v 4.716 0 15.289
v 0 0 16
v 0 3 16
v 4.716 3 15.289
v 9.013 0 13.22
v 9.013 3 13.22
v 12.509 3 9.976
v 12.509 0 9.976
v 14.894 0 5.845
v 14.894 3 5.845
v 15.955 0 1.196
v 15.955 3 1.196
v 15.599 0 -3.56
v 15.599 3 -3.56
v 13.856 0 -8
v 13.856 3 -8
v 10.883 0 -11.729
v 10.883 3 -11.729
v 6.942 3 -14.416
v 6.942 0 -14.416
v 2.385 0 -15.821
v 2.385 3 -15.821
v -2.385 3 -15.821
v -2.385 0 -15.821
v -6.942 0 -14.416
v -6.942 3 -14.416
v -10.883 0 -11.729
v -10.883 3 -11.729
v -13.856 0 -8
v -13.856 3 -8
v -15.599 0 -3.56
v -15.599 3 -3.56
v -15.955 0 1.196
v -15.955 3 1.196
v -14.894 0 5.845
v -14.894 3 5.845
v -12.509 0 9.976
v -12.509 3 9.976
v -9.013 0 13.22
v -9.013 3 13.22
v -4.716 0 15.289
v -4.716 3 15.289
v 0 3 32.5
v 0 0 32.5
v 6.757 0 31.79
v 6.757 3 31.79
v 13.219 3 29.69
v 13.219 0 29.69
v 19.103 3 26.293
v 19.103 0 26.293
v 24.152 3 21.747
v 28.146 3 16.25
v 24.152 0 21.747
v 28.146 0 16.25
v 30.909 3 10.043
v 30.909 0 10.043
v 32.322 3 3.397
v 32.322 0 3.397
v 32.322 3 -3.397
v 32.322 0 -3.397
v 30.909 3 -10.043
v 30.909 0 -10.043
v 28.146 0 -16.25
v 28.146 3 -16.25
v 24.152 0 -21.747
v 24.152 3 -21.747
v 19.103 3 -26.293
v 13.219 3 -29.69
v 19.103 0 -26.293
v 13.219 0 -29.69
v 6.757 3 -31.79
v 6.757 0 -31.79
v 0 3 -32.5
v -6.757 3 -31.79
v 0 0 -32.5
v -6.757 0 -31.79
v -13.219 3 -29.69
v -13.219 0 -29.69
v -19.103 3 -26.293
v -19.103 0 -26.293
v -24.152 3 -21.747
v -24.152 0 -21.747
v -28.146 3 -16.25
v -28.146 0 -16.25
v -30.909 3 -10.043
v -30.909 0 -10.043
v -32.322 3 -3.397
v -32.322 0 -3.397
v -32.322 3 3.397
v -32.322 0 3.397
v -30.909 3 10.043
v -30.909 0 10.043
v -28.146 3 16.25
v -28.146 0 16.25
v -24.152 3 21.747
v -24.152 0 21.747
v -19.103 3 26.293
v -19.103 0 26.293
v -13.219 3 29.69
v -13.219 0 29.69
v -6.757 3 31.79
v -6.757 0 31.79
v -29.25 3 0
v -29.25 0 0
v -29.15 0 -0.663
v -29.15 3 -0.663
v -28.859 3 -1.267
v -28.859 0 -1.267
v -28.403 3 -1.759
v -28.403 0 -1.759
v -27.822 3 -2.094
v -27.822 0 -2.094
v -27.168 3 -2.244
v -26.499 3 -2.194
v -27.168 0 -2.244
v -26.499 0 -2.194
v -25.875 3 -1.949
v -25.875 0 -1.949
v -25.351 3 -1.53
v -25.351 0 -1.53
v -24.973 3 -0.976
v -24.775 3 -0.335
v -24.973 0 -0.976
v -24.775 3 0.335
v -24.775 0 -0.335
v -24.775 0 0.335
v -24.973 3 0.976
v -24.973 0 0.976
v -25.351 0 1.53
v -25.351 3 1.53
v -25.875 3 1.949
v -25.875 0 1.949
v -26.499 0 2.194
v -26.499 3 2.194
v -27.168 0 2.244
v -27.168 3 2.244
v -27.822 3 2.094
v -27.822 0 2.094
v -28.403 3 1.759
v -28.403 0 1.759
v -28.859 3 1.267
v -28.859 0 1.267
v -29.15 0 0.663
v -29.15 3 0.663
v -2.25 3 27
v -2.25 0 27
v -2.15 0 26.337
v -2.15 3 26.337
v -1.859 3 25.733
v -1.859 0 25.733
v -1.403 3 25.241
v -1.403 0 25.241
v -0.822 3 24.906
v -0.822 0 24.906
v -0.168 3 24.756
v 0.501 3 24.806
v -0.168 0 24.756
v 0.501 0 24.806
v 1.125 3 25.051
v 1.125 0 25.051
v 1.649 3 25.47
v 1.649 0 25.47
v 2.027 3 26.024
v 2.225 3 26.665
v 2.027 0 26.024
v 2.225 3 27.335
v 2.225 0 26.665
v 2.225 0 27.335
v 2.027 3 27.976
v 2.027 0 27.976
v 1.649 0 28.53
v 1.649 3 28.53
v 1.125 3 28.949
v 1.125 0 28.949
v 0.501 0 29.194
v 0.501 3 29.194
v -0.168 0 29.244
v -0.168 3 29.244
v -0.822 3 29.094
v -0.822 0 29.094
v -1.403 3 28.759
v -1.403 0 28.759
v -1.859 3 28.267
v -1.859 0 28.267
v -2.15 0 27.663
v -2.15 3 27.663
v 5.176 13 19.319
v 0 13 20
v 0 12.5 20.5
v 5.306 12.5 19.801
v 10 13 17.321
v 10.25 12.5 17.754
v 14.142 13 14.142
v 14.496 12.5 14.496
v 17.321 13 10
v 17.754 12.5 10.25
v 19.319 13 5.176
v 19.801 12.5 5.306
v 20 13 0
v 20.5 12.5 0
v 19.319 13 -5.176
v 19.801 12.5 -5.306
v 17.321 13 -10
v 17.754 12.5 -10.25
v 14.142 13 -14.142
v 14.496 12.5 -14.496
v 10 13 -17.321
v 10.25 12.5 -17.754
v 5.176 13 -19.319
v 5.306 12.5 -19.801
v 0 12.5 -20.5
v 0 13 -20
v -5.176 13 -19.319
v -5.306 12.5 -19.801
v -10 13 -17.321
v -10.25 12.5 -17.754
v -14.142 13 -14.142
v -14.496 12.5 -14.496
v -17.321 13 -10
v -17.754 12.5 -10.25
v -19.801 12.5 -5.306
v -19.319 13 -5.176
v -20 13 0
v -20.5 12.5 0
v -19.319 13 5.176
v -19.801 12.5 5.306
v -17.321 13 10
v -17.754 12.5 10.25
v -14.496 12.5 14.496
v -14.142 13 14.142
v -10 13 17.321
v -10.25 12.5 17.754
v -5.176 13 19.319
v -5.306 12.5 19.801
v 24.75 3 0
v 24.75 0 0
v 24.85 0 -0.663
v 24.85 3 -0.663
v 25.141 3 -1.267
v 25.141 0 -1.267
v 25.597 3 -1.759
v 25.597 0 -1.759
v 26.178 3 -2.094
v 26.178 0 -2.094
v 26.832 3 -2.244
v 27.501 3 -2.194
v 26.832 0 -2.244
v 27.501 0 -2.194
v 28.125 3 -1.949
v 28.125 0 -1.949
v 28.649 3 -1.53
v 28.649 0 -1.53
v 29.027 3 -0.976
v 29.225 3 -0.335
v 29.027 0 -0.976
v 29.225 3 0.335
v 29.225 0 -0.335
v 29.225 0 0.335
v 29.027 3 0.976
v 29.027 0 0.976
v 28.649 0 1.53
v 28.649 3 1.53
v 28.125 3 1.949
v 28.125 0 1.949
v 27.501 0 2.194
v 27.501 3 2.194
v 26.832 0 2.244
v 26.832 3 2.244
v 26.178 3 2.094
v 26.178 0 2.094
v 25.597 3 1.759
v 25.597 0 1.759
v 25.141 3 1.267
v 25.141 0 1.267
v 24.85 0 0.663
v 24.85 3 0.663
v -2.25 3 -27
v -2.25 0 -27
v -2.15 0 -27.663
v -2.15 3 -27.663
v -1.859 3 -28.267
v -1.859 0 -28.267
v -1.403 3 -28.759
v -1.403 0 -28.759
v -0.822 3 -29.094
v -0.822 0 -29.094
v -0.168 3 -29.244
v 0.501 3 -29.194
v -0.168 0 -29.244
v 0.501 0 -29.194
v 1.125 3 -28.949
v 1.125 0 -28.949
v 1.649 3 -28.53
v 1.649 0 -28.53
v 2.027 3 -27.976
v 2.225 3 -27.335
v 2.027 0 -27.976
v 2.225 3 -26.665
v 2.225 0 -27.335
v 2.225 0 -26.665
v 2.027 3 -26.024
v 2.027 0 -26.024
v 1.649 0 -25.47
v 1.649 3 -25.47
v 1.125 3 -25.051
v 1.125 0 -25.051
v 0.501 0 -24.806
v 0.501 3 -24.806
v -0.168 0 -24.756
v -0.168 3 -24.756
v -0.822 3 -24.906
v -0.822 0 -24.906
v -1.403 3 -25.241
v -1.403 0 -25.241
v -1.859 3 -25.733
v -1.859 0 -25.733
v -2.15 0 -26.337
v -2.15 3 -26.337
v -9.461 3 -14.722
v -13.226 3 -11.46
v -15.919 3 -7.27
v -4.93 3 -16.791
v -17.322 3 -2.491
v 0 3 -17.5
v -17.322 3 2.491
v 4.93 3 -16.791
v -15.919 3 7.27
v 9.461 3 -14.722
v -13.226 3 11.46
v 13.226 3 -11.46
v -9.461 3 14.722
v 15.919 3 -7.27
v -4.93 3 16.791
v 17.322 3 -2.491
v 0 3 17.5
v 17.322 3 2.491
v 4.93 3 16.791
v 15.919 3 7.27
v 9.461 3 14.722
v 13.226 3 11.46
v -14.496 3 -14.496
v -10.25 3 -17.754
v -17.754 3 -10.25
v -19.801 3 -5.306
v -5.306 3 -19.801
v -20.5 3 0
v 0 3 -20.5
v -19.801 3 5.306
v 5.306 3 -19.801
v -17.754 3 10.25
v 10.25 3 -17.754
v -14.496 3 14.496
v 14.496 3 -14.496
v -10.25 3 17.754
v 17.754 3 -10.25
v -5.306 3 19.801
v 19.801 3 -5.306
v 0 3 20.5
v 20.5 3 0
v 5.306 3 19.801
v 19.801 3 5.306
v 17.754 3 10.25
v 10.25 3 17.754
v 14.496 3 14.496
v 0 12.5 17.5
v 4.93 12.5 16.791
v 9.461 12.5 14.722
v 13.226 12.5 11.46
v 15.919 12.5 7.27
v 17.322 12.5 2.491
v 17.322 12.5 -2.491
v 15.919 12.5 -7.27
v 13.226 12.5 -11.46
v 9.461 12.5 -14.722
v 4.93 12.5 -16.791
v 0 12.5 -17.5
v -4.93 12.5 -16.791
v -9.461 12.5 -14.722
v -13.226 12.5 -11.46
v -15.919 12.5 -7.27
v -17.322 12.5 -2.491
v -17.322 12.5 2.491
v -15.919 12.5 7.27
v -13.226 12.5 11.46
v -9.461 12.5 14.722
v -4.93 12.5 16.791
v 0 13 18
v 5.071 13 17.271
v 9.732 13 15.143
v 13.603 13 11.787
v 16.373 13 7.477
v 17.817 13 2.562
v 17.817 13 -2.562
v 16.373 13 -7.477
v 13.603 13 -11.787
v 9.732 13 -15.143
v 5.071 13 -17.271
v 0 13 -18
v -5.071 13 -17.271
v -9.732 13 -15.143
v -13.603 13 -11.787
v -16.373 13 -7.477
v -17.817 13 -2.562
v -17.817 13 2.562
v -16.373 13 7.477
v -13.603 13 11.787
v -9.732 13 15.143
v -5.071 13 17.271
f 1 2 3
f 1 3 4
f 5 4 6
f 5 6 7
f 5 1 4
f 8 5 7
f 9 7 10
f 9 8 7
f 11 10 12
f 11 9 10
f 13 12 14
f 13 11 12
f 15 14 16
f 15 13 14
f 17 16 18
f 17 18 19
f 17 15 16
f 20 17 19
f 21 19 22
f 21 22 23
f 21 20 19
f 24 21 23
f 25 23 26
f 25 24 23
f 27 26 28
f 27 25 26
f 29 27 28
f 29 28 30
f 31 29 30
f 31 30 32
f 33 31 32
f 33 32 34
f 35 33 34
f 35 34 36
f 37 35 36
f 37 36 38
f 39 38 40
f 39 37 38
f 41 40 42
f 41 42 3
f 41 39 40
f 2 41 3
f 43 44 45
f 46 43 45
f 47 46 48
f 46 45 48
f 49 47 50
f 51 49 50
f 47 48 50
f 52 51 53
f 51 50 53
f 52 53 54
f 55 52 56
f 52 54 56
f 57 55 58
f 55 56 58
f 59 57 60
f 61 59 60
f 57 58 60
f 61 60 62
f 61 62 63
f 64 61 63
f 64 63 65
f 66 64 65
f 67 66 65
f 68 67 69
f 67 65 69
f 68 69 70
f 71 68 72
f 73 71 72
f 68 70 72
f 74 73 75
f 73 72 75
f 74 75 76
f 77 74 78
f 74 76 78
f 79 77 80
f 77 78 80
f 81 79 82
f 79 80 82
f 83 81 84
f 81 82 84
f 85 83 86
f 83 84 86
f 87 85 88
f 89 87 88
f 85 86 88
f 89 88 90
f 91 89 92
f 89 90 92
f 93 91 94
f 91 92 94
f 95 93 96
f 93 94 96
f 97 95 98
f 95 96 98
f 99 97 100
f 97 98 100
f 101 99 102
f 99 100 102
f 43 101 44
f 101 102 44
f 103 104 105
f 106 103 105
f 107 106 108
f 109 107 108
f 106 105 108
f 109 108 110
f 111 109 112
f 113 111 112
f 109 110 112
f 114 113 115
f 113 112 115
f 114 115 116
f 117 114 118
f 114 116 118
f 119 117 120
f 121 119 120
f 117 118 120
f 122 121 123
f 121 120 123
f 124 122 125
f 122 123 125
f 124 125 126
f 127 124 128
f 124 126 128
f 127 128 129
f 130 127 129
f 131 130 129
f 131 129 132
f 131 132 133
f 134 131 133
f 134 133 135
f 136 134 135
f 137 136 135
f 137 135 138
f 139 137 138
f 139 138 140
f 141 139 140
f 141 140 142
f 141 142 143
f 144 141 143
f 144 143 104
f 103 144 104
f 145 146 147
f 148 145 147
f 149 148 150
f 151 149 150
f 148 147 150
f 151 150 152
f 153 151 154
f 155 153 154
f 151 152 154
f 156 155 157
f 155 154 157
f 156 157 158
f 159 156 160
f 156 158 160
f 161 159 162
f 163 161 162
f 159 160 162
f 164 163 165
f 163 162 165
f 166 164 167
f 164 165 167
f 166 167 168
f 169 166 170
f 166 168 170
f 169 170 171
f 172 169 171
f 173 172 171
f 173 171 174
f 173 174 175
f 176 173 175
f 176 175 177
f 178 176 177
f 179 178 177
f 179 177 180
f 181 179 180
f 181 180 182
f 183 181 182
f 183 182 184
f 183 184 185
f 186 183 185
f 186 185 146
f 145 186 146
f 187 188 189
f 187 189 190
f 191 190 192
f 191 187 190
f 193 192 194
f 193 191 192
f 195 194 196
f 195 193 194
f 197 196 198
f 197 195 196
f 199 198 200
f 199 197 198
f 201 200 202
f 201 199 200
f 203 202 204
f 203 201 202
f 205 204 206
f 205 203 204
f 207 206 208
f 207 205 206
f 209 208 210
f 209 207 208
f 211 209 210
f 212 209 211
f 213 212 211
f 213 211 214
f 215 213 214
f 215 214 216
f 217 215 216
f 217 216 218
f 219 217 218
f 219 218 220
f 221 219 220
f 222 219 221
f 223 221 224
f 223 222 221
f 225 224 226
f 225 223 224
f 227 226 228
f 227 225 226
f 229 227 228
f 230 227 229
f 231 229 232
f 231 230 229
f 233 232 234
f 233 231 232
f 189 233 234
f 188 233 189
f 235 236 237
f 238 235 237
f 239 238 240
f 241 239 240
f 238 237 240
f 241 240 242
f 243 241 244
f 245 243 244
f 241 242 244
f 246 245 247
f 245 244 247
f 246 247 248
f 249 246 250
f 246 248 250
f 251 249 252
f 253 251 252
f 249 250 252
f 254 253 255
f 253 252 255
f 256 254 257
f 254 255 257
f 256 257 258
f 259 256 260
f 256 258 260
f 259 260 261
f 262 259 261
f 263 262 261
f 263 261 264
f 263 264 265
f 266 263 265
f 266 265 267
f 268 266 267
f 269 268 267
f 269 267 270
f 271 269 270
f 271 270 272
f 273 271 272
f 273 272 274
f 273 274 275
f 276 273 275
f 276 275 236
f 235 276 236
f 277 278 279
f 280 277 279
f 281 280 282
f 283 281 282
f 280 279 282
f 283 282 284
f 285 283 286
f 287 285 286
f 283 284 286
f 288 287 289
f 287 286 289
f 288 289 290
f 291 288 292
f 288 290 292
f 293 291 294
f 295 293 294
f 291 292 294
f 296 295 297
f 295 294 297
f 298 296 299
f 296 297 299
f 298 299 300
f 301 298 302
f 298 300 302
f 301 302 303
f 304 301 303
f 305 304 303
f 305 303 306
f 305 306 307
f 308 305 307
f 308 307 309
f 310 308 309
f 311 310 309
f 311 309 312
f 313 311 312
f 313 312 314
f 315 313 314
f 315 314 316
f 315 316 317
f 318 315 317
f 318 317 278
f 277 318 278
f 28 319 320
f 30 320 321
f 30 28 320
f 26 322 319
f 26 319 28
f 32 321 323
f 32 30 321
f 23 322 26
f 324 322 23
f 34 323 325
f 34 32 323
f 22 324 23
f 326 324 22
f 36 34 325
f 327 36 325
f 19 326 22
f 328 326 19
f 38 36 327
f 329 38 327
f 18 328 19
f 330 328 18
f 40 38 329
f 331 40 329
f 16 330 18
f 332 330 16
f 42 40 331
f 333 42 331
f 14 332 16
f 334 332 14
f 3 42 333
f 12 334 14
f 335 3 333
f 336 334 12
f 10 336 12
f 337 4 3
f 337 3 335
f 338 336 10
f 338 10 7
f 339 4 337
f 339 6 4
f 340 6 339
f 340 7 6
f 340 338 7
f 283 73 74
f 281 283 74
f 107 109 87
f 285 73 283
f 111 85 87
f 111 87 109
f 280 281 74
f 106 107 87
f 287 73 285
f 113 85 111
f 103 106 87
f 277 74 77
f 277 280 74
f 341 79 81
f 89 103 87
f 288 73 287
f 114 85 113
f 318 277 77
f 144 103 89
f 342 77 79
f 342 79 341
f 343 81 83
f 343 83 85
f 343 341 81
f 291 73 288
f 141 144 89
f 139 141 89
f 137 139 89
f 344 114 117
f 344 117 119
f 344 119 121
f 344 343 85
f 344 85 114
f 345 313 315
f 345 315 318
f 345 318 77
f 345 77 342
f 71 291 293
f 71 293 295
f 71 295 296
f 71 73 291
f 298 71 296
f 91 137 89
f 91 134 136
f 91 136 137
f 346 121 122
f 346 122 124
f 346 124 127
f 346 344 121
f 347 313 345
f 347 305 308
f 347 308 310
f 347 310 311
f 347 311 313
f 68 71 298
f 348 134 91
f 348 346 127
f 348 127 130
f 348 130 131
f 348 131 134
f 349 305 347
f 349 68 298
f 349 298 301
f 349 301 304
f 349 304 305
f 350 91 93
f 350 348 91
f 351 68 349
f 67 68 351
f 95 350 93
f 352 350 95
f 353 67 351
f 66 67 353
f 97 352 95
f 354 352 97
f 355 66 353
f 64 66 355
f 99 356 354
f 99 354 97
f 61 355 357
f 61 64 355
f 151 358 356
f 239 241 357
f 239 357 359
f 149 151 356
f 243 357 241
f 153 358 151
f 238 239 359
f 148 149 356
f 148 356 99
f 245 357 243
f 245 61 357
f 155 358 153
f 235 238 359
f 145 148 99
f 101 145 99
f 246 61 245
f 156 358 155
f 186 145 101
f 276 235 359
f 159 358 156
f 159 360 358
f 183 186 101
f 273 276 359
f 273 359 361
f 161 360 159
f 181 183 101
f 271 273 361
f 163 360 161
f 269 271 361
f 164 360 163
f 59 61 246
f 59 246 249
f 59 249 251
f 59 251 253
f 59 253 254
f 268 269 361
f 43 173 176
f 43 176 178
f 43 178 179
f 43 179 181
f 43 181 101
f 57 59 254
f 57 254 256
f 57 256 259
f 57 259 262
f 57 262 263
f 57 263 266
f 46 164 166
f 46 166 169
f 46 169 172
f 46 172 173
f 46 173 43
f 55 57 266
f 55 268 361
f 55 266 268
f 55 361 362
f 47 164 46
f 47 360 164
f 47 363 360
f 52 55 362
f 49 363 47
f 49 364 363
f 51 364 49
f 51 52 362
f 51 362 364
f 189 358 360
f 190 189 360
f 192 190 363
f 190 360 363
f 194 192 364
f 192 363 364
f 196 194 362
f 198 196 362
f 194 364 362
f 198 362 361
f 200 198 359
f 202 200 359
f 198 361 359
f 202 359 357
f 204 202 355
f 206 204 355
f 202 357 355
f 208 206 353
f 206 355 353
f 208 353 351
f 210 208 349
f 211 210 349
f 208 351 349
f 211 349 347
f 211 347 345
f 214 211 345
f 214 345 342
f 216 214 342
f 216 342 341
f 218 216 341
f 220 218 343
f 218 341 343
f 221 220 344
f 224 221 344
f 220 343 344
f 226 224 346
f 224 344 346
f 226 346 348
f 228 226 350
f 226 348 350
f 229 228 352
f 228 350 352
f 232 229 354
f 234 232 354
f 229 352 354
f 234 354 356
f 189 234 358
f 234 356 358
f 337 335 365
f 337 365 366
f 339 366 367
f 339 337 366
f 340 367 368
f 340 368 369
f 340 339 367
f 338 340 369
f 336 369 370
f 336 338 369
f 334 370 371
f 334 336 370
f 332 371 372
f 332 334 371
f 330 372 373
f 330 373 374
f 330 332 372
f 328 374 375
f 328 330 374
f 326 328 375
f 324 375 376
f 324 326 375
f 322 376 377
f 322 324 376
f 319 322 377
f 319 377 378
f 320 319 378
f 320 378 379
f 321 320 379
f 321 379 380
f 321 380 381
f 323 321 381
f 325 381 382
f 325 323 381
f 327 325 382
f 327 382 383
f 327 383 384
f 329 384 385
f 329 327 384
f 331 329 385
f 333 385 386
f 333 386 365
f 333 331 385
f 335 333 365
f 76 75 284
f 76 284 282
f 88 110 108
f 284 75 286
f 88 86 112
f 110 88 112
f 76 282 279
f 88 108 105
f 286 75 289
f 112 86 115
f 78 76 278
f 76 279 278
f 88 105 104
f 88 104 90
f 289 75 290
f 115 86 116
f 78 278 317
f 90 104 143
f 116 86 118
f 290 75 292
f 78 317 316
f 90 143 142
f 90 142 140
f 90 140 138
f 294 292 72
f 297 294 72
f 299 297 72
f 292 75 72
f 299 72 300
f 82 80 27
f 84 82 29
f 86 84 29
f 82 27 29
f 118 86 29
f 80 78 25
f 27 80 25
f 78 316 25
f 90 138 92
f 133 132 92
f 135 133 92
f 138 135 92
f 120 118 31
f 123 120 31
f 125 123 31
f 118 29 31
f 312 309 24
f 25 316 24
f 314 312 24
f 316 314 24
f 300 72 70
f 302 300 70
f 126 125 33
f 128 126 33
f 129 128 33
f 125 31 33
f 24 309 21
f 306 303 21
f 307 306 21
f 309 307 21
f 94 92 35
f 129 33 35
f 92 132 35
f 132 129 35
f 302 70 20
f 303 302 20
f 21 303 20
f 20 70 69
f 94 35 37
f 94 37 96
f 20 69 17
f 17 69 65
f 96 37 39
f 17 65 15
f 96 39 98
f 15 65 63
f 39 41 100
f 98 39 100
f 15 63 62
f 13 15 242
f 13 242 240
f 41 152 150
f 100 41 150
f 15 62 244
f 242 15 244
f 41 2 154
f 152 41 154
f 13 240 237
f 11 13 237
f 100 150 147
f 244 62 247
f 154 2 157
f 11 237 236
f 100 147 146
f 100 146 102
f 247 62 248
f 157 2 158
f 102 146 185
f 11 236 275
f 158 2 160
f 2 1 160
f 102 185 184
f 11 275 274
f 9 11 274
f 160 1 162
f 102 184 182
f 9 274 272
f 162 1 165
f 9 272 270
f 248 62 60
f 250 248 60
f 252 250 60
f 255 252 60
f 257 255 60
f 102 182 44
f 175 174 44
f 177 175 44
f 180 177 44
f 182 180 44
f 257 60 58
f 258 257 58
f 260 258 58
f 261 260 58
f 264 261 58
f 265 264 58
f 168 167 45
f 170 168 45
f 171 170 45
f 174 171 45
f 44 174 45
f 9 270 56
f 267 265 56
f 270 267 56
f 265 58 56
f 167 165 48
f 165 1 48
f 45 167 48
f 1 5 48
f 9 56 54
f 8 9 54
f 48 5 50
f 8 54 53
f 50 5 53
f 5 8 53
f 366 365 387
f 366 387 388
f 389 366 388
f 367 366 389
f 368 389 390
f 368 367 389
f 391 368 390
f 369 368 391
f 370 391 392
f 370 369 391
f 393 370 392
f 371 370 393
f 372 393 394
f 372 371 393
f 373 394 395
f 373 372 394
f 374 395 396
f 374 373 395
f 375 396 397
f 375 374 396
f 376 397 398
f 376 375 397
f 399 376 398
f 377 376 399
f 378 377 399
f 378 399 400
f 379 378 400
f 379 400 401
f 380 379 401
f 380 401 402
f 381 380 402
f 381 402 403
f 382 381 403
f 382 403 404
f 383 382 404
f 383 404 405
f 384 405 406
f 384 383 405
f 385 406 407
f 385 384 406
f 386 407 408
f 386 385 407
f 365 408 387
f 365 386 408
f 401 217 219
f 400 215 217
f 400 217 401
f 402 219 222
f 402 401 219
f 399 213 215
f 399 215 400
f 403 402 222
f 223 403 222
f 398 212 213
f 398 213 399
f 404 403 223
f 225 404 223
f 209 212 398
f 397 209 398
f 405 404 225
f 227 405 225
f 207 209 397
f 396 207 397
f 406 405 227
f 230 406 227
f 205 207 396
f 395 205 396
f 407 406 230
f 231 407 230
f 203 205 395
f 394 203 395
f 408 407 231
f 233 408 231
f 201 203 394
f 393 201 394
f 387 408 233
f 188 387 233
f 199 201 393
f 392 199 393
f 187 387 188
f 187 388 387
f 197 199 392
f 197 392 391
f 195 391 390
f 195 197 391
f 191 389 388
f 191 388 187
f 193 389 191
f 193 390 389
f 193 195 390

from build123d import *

# Parameters (mm, degrees)
SKETCH1_R                = 32.5
SKETCH1_R_2              = 16
SKETCH1_R_3              = 1
BOSS_EXTRUDE1_DEPTH      = 3
SKETCH2_R                = 20.5
SKETCH2_R_2              = 17.5
BOSS_EXTRUDE2_DEPTH      = 10
M4_CLEARANCE_HOLE2_D     = 4.5
M4_CLEARANCE_HOLE2_DEPTH = 11.5
M4_CLEARANCE_HOLE2_TIP   = 1.351936393
CHAMFER1_SIZE            = 0.5


with BuildPart() as part:
    # Sketch1 → Boss-Extrude1 (new body)
    with BuildSketch(Plane(origin=(0, 0, 0), x_dir=(1, 0, 0), z_dir=(0, 1, 0))):
        with Locations(Location((0, 0, 0), (0, 0, 270))):
            Circle(SKETCH1_R)
        with Locations(Location((0, 0, 0), (0, 0, 270))):
            Circle(SKETCH1_R_2, mode=Mode.SUBTRACT)
        with Locations(Location((0, 27, 0), (0, 0, 270))):
            Circle(SKETCH1_R_3, mode=Mode.SUBTRACT)
        with Locations(Location((27, 0, 0), (0, 0, 270))):
            Circle(SKETCH1_R_3, mode=Mode.SUBTRACT)
        with Locations(Location((0, -27, 0), (0, 0, 270))):
            Circle(SKETCH1_R_3, mode=Mode.SUBTRACT)
        with Locations(Location((-27, 0, 0), (0, 0, 270))):
            Circle(SKETCH1_R_3, mode=Mode.SUBTRACT)
    extrude(amount=BOSS_EXTRUDE1_DEPTH)

    # Sketch2 → Boss-Extrude2 (add)
    with BuildSketch(Plane(origin=(0, 3, 0), x_dir=(1, 0, 0), z_dir=(0, 1, 0))):
        with Locations(Location((0, 0, 0), (0, 0, 270))):
            Circle(SKETCH2_R)
        with Locations(Location((0, 0, 0), (0, 0, 270))):
            Circle(SKETCH2_R_2, mode=Mode.SUBTRACT)
    extrude(amount=BOSS_EXTRUDE2_DEPTH)

    # M4 Clearance Hole2
    with Locations(Plane(origin=(0, 3, 0), x_dir=(1, 0, 0), z_dir=(0, 1, 0))):
        with Locations((0, 27), (27, 0), (0, -27), (-27, 0)):
            Hole(M4_CLEARANCE_HOLE2_D / 2, depth=M4_CLEARANCE_HOLE2_DEPTH)
            with Locations((0, 0, -(M4_CLEARANCE_HOLE2_DEPTH + M4_CLEARANCE_HOLE2_TIP / 2))):  # 118° drill point
                Cone(0, M4_CLEARANCE_HOLE2_D / 2, M4_CLEARANCE_HOLE2_TIP, mode=Mode.SUBTRACT)

    # Chamfer1
    chamfer1_edges = [part.edges().sort_by_distance(p)[0] for p in [
        (0, 13, -20.5),
        (0, 13, -17.5),
    ]]
    chamfer(chamfer1_edges, length=CHAMFER1_SIZE)


solid = part.part
